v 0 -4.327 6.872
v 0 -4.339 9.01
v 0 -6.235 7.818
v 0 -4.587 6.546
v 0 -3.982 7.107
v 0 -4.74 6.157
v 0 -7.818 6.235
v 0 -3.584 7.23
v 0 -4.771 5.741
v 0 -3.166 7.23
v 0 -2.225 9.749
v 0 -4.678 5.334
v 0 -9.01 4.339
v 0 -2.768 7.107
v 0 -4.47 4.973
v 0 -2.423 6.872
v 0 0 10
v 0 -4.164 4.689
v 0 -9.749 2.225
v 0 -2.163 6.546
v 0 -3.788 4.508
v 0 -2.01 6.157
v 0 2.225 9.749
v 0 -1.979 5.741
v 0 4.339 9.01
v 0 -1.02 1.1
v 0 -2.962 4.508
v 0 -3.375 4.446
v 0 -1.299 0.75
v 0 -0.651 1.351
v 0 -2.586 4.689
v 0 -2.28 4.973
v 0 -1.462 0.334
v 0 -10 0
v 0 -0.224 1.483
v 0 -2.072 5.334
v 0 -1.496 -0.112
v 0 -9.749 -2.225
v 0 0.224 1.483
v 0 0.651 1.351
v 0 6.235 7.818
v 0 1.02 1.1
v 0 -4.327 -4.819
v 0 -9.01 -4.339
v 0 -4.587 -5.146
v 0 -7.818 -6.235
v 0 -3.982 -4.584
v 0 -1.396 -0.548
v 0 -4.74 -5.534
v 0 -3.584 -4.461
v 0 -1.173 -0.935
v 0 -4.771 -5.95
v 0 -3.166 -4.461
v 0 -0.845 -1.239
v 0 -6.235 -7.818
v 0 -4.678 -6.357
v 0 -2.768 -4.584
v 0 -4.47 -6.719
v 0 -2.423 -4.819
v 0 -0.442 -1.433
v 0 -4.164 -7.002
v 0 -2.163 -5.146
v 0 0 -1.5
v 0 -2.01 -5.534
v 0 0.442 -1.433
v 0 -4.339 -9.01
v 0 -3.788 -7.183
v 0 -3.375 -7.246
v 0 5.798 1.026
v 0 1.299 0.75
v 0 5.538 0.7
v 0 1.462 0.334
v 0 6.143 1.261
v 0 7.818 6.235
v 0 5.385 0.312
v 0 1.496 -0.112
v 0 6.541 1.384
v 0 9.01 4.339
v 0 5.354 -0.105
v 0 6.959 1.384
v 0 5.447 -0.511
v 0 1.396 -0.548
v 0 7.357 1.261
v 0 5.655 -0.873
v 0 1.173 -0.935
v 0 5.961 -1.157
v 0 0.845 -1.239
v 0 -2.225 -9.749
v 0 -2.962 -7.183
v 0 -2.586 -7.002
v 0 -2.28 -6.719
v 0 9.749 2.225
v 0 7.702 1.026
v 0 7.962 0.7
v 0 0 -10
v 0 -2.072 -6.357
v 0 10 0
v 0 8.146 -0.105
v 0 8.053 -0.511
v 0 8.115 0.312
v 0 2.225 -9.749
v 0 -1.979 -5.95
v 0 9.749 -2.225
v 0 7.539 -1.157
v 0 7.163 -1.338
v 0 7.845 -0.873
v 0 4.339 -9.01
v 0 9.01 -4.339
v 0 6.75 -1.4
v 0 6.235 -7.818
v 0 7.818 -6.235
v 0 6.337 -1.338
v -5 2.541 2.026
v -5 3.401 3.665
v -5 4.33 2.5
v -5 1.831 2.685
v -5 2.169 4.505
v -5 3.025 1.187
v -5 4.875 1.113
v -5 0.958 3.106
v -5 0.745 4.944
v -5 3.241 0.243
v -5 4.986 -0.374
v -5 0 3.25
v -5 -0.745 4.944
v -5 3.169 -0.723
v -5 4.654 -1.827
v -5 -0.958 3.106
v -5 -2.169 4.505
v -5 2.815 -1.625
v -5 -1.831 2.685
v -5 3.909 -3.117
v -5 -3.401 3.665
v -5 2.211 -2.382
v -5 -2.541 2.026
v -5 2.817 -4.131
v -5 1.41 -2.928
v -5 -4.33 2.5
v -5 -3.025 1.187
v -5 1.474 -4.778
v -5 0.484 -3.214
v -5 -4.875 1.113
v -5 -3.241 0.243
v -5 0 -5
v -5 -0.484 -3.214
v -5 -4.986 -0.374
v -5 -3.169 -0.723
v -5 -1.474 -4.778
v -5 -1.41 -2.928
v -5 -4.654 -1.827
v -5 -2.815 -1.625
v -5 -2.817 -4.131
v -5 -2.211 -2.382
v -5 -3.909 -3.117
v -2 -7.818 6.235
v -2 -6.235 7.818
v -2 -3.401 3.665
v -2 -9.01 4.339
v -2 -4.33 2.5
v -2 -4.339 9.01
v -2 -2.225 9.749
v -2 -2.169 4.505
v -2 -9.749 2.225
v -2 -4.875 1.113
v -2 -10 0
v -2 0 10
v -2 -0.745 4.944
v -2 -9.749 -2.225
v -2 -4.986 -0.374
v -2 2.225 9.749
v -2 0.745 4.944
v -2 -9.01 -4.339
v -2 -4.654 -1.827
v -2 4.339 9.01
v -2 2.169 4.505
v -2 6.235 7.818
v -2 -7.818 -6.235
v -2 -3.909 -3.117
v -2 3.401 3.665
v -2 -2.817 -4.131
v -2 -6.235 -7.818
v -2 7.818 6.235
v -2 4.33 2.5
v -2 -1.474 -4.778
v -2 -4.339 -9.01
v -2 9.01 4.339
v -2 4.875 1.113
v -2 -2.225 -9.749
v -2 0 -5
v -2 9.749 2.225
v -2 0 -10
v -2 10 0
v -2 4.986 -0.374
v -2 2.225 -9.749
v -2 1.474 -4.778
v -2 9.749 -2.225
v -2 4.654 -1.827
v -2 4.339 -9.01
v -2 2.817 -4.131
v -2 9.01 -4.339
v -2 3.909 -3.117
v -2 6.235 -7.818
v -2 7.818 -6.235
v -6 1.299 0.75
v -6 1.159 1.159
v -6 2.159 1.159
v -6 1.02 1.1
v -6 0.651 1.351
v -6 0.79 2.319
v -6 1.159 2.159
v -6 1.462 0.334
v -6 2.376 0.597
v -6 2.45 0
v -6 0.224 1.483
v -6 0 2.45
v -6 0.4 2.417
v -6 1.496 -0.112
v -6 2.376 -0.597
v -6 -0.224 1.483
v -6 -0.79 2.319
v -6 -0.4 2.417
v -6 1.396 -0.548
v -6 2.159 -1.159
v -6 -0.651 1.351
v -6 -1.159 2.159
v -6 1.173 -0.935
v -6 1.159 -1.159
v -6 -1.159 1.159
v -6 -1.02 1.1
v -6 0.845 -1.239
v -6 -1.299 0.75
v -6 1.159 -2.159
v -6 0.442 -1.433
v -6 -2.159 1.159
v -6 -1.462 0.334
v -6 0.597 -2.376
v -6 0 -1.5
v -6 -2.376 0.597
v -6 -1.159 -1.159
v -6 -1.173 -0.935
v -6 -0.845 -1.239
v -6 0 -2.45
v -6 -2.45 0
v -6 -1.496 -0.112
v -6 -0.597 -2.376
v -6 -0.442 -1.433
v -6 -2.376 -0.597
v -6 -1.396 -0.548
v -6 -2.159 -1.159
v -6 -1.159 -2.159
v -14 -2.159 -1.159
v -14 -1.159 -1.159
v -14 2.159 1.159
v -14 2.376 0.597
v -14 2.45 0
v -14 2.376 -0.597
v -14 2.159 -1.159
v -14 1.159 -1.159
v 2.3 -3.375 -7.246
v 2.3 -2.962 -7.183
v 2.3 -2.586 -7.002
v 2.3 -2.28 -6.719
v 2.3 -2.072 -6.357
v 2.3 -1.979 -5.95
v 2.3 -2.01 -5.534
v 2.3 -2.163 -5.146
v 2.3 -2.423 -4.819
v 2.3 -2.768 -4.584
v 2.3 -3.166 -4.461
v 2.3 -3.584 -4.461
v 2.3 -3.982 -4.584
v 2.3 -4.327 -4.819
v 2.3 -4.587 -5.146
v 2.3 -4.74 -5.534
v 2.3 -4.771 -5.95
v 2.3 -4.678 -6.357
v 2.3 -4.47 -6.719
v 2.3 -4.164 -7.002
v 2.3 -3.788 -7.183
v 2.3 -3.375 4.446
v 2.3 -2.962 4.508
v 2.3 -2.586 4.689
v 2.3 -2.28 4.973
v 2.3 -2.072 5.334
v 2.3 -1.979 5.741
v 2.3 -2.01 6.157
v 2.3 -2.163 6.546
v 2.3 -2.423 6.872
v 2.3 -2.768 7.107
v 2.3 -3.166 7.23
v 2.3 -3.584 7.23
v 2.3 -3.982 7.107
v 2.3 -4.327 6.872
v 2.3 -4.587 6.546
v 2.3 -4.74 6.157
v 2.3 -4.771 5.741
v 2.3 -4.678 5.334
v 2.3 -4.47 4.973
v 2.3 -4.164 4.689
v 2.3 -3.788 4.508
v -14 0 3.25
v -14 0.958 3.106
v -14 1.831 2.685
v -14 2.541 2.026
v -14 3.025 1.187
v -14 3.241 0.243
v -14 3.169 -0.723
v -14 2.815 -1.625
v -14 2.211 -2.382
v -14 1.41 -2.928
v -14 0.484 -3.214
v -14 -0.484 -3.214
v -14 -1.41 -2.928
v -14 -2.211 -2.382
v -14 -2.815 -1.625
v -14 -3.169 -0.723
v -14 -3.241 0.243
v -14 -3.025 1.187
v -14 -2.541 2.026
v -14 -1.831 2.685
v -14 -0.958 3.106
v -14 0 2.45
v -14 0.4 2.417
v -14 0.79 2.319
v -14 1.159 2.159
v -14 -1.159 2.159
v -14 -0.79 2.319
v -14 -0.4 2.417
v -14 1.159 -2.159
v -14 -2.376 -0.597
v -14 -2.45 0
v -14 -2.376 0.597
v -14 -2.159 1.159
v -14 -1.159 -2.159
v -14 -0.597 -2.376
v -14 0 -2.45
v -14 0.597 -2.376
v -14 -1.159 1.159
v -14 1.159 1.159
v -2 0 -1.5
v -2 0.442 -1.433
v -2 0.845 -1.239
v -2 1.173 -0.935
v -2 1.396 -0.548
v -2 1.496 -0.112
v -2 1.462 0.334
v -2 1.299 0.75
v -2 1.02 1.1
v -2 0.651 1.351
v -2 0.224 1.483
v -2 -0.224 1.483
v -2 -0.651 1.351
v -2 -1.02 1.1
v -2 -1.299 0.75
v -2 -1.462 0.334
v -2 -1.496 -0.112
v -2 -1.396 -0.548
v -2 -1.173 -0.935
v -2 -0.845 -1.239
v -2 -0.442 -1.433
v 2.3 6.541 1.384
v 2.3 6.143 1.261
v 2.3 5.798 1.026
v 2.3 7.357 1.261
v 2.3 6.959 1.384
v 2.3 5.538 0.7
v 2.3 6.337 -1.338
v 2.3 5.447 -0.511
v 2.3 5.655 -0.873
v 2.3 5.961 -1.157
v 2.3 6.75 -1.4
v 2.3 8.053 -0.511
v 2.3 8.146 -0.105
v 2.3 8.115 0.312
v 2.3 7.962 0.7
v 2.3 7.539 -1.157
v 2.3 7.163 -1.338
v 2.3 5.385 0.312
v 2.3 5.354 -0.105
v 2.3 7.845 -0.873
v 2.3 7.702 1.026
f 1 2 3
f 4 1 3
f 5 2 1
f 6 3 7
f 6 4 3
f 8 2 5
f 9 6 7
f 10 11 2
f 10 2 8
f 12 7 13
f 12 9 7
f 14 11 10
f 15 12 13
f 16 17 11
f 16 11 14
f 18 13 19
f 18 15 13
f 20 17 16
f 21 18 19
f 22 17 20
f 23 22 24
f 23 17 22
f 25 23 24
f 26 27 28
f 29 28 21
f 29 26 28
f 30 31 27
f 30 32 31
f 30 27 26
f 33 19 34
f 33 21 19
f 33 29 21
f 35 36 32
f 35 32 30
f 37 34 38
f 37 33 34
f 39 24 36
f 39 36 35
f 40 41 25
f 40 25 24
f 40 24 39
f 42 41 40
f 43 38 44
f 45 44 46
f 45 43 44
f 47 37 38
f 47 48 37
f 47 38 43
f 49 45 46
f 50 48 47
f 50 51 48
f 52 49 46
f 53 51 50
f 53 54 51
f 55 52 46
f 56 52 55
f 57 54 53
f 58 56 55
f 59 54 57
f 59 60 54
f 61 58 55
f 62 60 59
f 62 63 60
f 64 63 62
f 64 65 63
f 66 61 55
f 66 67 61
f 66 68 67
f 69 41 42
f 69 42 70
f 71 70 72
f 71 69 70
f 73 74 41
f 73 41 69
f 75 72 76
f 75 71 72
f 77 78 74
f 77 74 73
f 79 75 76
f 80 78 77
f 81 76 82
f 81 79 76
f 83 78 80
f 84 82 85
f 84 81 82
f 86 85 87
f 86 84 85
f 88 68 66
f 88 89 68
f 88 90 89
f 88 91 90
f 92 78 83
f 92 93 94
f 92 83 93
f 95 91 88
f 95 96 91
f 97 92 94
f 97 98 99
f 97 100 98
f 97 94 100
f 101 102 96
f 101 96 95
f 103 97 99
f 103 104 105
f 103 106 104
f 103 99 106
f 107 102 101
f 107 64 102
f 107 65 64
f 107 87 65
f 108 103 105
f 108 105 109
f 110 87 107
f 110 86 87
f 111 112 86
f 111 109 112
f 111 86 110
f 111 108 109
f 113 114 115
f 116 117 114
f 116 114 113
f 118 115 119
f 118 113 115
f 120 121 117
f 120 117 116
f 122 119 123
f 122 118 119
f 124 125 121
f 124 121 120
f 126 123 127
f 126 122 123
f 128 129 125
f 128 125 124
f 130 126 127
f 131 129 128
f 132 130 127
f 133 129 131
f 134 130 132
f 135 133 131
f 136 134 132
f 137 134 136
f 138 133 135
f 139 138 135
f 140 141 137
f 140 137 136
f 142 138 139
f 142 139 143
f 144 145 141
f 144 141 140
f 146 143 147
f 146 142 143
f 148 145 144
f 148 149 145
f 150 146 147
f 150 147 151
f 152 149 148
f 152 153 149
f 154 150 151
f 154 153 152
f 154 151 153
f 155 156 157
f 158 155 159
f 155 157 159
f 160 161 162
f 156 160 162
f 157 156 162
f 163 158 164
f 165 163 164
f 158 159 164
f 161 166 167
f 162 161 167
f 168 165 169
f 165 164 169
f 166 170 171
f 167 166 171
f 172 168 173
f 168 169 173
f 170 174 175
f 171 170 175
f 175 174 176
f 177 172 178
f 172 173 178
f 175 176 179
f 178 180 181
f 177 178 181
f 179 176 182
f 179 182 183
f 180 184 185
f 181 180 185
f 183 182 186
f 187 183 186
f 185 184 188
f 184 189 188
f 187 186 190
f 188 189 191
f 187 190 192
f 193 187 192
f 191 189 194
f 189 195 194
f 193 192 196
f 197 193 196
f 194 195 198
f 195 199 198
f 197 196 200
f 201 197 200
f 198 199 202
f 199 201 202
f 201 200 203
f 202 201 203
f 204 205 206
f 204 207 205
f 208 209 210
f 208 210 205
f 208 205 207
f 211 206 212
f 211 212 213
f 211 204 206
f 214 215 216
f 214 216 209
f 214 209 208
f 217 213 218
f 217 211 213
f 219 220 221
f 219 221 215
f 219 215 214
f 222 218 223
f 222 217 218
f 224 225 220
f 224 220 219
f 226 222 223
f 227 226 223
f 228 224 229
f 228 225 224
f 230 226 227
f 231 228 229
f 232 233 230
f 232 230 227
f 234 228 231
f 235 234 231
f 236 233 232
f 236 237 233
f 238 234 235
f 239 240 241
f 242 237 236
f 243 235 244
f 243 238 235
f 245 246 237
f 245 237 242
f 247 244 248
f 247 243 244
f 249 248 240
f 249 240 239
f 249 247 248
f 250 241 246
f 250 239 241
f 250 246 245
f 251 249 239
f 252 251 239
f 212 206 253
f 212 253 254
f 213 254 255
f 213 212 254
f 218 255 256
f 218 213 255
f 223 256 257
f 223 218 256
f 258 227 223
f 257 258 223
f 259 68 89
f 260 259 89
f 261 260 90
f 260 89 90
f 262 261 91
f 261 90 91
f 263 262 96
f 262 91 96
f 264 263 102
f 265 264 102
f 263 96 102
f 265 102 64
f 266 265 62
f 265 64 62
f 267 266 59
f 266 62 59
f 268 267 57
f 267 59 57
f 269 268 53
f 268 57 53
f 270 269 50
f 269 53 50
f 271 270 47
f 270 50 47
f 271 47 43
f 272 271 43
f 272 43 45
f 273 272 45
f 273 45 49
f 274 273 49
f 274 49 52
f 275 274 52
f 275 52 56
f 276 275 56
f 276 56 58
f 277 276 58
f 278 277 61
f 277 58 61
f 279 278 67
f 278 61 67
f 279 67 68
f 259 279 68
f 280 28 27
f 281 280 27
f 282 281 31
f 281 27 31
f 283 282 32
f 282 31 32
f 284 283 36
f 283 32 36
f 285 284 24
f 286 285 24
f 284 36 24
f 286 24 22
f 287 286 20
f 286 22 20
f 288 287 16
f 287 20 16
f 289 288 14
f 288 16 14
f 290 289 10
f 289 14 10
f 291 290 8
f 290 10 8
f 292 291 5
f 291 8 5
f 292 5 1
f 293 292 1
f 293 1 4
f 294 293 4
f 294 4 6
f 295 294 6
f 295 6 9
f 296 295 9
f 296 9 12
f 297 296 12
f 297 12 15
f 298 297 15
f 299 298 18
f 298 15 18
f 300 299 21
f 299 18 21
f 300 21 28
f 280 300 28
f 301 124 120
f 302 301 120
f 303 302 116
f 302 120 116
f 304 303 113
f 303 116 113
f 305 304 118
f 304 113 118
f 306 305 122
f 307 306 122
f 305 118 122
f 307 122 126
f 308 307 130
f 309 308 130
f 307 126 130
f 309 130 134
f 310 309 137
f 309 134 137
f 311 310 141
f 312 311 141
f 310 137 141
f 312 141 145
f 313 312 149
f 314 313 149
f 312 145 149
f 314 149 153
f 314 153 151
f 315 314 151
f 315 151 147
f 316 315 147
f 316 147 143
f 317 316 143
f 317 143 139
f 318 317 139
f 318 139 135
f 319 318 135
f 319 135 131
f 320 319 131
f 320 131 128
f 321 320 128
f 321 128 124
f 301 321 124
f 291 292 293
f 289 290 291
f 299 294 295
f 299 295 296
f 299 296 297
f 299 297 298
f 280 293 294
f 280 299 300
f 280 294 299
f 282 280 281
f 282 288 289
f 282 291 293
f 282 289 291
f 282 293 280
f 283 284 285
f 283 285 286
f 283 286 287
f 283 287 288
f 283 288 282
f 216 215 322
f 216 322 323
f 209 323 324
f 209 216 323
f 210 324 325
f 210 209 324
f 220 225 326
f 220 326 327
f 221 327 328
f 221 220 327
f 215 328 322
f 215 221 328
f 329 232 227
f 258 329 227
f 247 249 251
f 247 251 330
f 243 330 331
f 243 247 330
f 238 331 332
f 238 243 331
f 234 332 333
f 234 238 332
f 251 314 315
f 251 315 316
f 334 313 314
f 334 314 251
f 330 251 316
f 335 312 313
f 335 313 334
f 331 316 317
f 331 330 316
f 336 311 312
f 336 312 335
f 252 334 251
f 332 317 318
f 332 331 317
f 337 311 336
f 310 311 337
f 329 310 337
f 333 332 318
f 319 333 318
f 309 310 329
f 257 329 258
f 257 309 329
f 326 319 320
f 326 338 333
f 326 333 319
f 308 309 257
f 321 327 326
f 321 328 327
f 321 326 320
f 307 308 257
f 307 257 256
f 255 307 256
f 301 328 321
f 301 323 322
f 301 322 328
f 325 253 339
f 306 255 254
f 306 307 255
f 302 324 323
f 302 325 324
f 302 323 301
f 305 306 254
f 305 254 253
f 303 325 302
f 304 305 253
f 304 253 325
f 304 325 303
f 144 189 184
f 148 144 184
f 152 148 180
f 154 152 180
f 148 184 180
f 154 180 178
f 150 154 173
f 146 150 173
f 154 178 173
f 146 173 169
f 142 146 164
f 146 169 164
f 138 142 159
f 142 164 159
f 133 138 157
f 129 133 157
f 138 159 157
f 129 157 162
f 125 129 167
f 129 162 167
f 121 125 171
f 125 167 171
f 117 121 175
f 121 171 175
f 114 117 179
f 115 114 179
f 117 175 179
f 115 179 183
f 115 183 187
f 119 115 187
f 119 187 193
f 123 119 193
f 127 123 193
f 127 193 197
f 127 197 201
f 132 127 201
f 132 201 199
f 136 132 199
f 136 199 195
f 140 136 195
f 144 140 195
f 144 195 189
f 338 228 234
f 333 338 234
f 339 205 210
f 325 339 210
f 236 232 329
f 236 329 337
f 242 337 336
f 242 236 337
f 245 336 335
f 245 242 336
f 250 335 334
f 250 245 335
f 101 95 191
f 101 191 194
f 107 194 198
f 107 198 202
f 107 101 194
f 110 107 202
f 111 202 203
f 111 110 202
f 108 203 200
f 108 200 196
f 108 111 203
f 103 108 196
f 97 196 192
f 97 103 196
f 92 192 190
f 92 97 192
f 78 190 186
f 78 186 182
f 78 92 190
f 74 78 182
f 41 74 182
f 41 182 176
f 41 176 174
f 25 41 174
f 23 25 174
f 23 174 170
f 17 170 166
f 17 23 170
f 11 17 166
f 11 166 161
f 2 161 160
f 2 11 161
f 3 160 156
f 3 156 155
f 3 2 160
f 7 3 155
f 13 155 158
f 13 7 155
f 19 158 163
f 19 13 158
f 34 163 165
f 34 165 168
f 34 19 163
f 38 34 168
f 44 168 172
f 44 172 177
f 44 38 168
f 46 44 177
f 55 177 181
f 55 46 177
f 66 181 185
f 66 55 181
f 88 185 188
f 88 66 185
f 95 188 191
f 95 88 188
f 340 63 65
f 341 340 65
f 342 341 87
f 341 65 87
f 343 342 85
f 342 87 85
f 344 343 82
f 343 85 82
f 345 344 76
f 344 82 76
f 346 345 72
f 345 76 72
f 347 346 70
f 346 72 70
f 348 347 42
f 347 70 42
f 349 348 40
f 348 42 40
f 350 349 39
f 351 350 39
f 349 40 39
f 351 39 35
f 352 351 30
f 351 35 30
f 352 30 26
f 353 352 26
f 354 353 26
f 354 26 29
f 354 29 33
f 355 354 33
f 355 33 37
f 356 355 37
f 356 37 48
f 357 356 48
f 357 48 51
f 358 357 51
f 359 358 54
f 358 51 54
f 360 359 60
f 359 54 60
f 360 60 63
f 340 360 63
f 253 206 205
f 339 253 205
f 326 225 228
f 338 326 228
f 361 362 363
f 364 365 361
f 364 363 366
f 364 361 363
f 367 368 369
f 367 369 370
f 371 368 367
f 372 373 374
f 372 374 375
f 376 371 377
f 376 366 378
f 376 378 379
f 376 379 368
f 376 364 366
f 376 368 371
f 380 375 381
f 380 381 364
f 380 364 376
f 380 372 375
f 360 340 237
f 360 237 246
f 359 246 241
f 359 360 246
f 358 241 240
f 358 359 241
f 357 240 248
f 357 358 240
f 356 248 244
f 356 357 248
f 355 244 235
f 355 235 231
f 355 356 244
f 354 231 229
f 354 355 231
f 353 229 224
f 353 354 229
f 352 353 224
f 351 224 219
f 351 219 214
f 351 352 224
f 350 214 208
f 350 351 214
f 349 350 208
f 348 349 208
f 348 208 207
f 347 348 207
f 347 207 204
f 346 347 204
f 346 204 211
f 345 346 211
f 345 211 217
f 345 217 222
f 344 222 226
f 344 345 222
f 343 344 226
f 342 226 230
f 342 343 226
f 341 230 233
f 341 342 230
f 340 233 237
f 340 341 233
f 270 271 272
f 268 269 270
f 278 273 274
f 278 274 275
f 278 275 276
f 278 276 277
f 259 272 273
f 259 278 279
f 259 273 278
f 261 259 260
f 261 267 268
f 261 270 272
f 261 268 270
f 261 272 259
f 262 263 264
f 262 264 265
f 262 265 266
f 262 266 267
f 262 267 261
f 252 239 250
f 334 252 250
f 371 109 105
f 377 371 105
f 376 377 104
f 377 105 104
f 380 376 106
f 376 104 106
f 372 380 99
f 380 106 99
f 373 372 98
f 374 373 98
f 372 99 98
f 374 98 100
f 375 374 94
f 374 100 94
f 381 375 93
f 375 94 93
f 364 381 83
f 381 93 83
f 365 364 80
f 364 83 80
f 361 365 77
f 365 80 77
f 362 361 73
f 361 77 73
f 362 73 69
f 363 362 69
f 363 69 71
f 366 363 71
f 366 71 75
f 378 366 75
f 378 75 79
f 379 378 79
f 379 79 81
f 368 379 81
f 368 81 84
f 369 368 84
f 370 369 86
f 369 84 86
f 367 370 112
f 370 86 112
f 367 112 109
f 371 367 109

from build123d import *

# Parameters (mm, degrees)
SKETCH_1_R          = 1.4
EXTRUDE_1_DEPTH     = 2.3
EXTRUDE_1_2_DEPTH   = 2.3
EXTRUDE_1_3_DEPTH   = 2.3
SKETCH_2_R          = 10
SKETCH_2_R_2        = 1.5
EXTRUDE_2_DEPTH     = 2
SKETCH_3_R          = 5
SKETCH_3_R_2        = 1.5
EXTRUDE_3_DEPTH     = 4
SKETCH_4_R          = 3.25
SKETCH_4_R_2        = 2.45
EXTRUDE_4_DEPTH     = 8
EXTRUDE_5_DEPTH     = 8
CUT_EXTRUDE_START   = -1
SKETCH_4_6_R        = 5
SKETCH_4_6_R_2      = 3.25
CUT_EXTRUDE_1_DEPTH = 1


with BuildPart() as part:
    # 草图1 → 凸台-拉伸1 (new body)
    with BuildSketch(Plane(origin=(0, 0, 0), x_dir=(0, 0, -1), z_dir=(1, 0, 0))):
        with Locations((0, 6.75)):
            Circle(SKETCH_1_R)
    extrude(amount=EXTRUDE_1_DEPTH)



with BuildPart() as body_2:
    # 草图1 → Extrude 1 2 (new body)
    with BuildSketch(Plane(origin=(0, 0, 0), x_dir=(0, 0, -1), z_dir=(1, 0, 0))):
        with Locations((5.845671476, -3.375)):
            Circle(SKETCH_1_R)
    extrude(amount=EXTRUDE_1_2_DEPTH)


with BuildPart() as body_3:
    # 草图1 → Extrude 1 3 (new body)
    with BuildSketch(Plane(origin=(0, 0, 0), x_dir=(0, 0, -1), z_dir=(1, 0, 0))):
        with Locations((-5.845671476, -3.375)):
            Circle(SKETCH_1_R)
    extrude(amount=EXTRUDE_1_3_DEPTH)


with BuildPart() as part_1:
    add(part.part)

    add(body_2.part)  # 凸台-拉伸2 merges body 2

    add(body_3.part)  # 凸台-拉伸2 merges body 3
    # 草图2 → 凸台-拉伸2 (add)
    with BuildSketch(Plane(origin=(0, 0, 0), x_dir=(0, 0, -1), z_dir=(1, 0, 0))):
        Circle(SKETCH_2_R)
        Circle(SKETCH_2_R_2, mode=Mode.SUBTRACT)
    extrude(amount=-EXTRUDE_2_DEPTH)

    # 草图3 → 凸台-拉伸3 (add)
    with BuildSketch(Plane.ZY.offset(2)):
        with Locations(Location((0, 0, 0), (0, 0, 180))):
            Circle(SKETCH_3_R)
        with Locations(Location((0, 0, 0), (0, 0, 180))):
            Circle(SKETCH_3_R_2, mode=Mode.SUBTRACT)
    extrude(amount=EXTRUDE_3_DEPTH)

    # 草图4 → 凸台-拉伸4 (add)
    with BuildSketch(Plane.ZY.offset(6)):
        Circle(SKETCH_4_R)
        Circle(SKETCH_4_R_2, mode=Mode.SUBTRACT)
    extrude(amount=EXTRUDE_4_DEPTH)

    # 草图4<3> → 凸台-拉伸5 (add)
    with BuildSketch(Plane.ZY.offset(6)):
        with BuildLine():
            Line((2.158689242, -1.158689242), (1.158689242, -1.158689242))
            Line((1.158689242, -1.158689242), (1.158689242, -2.158689242))
            ThreePointArc((1.158689242, -2.158689242), (1.732411614, -1.732411614), (2.158689242, -1.158689242))
        make_face()
        with BuildLine():
            ThreePointArc((2.158689242, 1.158689242), (1.732411614, 1.732411614), (1.158689242, 2.158689242))
            Line((1.158689242, 2.158689242), (1.158689242, 1.158689242))
            Line((1.158689242, 1.158689242), (2.158689242, 1.158689242))
        make_face()
        with BuildLine():
            Line((-1.158689242, 1.158689242), (-1.158689242, 2.158689242))
            ThreePointArc((-1.158689242, 2.158689242), (-1.732411614, 1.732411614), (-2.158689242, 1.158689242))
            Line((-2.158689242, 1.158689242), (-1.158689242, 1.158689242))
        make_face()
        with BuildLine():
            Line((-1.158689242, -2.158689242), (-1.158689242, -1.158689242))
            Line((-1.158689242, -1.158689242), (-2.158689242, -1.158689242))
            ThreePointArc((-2.158689242, -1.158689242), (-1.732411614, -1.732411614), (-1.158689242, -2.158689242))
        make_face()
    extrude(amount=EXTRUDE_5_DEPTH)

    # 草图4<6> → 切除-拉伸1 (cut)
    with BuildSketch(Plane.ZY.offset(6).offset(CUT_EXTRUDE_START)):
        with Locations(Location((0, 0, 0), (0, 0, 180))):
            Circle(SKETCH_4_6_R)
        Circle(SKETCH_4_6_R_2, mode=Mode.SUBTRACT)
    extrude(amount=CUT_EXTRUDE_1_DEPTH, mode=Mode.SUBTRACT)


solid = part_1.part
